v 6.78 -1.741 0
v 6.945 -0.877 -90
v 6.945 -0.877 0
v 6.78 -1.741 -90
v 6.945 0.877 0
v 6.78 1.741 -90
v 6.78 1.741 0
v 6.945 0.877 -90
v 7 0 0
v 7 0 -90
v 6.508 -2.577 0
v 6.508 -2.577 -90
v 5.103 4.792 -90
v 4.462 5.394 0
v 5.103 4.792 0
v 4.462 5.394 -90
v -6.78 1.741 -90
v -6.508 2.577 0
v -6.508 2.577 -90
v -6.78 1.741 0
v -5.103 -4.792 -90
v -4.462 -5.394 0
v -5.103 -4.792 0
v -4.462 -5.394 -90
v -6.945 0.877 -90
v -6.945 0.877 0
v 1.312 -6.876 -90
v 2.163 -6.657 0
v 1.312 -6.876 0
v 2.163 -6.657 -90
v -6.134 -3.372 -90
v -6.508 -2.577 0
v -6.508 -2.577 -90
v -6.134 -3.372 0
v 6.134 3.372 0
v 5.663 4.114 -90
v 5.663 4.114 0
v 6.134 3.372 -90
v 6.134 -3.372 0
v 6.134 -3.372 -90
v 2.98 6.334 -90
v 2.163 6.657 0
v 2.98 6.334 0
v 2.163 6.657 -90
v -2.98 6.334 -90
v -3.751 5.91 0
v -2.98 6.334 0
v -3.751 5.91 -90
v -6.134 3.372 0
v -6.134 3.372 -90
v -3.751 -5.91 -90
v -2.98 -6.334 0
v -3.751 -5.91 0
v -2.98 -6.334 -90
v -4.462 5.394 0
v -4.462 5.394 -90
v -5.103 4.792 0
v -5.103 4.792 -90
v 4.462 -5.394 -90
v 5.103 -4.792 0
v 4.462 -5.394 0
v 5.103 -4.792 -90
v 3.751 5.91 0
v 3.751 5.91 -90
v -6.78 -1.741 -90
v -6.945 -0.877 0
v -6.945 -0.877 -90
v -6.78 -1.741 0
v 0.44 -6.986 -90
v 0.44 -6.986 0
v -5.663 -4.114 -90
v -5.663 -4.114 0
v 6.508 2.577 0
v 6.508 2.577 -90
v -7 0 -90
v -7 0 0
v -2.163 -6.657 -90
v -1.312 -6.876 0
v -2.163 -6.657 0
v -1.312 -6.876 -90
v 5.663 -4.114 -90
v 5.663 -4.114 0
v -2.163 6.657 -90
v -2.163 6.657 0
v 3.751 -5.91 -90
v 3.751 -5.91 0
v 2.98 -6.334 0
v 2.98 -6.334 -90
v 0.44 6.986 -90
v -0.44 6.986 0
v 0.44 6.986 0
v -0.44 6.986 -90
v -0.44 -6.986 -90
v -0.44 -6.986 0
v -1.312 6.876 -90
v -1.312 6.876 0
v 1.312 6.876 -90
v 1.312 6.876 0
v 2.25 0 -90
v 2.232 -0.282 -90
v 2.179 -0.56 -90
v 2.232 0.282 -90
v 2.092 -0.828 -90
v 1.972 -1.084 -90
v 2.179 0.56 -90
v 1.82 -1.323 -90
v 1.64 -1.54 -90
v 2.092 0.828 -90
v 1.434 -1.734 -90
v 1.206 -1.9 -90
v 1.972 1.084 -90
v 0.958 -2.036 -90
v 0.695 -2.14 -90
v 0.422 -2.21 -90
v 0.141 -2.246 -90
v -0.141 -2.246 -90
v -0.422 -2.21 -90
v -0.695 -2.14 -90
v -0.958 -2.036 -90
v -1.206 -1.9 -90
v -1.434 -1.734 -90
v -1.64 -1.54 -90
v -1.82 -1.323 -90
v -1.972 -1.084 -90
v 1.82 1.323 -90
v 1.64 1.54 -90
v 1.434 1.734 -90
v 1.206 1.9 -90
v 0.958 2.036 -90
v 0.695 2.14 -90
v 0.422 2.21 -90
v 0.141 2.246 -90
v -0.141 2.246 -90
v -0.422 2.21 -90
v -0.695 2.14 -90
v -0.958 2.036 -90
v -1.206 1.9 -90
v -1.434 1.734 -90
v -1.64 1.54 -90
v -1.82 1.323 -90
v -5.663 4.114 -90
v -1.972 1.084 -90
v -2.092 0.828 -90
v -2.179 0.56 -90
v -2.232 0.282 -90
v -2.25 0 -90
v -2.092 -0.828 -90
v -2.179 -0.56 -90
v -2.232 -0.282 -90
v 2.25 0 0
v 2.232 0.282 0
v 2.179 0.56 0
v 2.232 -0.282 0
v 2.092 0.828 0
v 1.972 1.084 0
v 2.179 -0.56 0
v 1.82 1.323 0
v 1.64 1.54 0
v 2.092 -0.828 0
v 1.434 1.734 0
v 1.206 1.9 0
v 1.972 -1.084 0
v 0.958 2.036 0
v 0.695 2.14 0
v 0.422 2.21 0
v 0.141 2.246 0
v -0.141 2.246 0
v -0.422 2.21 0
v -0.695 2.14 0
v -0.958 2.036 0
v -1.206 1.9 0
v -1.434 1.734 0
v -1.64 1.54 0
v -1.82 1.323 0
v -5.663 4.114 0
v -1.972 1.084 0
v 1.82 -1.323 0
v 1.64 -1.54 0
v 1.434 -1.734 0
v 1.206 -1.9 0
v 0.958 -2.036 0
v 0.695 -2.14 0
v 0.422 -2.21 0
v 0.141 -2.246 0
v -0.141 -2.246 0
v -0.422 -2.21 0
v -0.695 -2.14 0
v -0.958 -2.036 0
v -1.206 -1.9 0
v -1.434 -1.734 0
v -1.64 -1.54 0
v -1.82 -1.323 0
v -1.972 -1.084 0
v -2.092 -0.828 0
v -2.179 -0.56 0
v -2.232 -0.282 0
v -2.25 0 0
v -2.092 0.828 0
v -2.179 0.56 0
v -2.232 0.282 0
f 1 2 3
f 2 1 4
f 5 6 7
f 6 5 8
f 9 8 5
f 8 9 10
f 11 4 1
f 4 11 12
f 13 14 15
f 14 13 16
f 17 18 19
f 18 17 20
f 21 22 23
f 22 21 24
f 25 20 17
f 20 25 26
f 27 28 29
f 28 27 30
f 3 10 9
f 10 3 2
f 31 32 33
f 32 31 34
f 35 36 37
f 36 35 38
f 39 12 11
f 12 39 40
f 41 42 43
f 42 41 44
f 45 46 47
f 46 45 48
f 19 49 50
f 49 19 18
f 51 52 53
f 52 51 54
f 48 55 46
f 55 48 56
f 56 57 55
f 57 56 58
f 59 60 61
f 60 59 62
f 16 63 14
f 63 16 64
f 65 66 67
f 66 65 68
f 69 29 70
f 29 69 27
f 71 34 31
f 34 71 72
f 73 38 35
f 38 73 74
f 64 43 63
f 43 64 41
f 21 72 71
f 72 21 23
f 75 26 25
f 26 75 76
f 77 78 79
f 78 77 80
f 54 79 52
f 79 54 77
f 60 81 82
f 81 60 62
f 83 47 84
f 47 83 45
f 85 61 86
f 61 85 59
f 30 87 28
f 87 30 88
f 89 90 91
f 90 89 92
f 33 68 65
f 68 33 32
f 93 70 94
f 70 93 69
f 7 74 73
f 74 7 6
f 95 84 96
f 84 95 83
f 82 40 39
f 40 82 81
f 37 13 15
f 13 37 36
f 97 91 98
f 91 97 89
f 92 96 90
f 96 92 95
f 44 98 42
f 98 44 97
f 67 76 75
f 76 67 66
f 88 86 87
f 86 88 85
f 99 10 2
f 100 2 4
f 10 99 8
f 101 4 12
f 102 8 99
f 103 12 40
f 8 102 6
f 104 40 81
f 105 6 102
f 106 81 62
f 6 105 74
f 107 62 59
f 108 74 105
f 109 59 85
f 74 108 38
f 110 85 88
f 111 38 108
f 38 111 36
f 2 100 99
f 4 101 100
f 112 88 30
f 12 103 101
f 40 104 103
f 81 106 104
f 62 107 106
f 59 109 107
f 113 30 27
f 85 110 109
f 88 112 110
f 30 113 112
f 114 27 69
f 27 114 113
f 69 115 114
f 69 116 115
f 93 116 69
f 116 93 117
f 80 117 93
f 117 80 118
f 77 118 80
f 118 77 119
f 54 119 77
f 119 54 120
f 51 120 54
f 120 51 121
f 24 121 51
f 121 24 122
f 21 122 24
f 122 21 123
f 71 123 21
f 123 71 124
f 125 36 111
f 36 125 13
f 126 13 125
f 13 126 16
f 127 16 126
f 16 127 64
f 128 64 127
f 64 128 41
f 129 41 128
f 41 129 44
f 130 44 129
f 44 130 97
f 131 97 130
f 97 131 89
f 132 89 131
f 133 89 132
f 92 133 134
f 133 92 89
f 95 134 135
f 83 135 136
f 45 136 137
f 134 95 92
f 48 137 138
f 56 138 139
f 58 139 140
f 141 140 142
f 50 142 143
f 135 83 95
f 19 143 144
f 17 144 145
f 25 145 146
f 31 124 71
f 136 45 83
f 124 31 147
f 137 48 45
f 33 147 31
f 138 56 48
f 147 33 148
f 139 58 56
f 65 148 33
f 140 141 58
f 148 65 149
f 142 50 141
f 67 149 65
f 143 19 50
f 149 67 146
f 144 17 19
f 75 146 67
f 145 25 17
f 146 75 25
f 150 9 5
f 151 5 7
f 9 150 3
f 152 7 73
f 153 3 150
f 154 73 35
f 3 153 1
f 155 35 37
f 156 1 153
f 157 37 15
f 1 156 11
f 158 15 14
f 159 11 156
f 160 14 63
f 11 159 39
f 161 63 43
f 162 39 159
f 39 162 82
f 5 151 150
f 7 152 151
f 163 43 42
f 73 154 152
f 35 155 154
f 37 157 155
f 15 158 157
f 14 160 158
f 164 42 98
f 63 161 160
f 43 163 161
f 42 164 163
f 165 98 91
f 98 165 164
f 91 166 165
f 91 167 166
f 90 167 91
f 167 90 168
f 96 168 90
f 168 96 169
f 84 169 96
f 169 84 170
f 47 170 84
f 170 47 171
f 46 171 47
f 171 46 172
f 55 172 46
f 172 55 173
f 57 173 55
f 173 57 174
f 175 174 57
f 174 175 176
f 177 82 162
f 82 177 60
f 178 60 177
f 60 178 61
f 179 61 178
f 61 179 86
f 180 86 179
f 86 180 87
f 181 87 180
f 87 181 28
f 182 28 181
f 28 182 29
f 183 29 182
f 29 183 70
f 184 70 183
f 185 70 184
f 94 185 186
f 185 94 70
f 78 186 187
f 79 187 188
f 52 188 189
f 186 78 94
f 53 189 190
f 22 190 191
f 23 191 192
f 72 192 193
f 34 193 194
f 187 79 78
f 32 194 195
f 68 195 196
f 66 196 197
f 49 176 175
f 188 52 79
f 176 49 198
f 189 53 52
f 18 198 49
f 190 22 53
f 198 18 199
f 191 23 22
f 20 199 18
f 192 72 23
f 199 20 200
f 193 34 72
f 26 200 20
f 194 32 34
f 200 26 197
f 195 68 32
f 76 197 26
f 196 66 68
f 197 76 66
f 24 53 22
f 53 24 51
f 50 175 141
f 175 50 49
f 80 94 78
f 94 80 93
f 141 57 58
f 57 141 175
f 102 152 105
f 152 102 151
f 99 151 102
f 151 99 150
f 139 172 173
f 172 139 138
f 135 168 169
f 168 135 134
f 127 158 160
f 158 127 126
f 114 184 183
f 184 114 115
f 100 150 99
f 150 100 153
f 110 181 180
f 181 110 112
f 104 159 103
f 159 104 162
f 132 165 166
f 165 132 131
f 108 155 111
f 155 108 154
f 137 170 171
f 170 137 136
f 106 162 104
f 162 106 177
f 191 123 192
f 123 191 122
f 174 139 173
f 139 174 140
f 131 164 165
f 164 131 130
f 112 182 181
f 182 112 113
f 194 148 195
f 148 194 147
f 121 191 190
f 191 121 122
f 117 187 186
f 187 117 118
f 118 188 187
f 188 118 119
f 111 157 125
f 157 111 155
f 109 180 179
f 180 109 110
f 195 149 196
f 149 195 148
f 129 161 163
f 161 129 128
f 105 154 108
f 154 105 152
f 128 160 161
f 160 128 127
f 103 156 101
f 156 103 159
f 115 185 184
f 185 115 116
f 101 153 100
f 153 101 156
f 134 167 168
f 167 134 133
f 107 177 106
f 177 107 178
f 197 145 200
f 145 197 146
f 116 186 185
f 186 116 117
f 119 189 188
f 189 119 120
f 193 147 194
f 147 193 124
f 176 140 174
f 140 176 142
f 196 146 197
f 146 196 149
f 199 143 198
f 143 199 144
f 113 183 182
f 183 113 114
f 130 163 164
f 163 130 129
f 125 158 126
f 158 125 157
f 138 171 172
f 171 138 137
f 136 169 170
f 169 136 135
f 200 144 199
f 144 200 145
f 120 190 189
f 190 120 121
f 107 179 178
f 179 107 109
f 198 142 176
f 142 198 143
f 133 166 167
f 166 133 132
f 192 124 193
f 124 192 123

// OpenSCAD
$fn = 50;


difference() {
	union() {
		translate(v = [0, 0, -90.0000000000]) {
			cylinder(h = 90, r = 7.0000000000);
		}
		cylinder(h = 0, r = 16.0000000000);
	}
	union() {
		#translate(v = [0, 0, -90]) {
			cylinder(h = 90, r = 2.2500000000);
		}
	}
}
